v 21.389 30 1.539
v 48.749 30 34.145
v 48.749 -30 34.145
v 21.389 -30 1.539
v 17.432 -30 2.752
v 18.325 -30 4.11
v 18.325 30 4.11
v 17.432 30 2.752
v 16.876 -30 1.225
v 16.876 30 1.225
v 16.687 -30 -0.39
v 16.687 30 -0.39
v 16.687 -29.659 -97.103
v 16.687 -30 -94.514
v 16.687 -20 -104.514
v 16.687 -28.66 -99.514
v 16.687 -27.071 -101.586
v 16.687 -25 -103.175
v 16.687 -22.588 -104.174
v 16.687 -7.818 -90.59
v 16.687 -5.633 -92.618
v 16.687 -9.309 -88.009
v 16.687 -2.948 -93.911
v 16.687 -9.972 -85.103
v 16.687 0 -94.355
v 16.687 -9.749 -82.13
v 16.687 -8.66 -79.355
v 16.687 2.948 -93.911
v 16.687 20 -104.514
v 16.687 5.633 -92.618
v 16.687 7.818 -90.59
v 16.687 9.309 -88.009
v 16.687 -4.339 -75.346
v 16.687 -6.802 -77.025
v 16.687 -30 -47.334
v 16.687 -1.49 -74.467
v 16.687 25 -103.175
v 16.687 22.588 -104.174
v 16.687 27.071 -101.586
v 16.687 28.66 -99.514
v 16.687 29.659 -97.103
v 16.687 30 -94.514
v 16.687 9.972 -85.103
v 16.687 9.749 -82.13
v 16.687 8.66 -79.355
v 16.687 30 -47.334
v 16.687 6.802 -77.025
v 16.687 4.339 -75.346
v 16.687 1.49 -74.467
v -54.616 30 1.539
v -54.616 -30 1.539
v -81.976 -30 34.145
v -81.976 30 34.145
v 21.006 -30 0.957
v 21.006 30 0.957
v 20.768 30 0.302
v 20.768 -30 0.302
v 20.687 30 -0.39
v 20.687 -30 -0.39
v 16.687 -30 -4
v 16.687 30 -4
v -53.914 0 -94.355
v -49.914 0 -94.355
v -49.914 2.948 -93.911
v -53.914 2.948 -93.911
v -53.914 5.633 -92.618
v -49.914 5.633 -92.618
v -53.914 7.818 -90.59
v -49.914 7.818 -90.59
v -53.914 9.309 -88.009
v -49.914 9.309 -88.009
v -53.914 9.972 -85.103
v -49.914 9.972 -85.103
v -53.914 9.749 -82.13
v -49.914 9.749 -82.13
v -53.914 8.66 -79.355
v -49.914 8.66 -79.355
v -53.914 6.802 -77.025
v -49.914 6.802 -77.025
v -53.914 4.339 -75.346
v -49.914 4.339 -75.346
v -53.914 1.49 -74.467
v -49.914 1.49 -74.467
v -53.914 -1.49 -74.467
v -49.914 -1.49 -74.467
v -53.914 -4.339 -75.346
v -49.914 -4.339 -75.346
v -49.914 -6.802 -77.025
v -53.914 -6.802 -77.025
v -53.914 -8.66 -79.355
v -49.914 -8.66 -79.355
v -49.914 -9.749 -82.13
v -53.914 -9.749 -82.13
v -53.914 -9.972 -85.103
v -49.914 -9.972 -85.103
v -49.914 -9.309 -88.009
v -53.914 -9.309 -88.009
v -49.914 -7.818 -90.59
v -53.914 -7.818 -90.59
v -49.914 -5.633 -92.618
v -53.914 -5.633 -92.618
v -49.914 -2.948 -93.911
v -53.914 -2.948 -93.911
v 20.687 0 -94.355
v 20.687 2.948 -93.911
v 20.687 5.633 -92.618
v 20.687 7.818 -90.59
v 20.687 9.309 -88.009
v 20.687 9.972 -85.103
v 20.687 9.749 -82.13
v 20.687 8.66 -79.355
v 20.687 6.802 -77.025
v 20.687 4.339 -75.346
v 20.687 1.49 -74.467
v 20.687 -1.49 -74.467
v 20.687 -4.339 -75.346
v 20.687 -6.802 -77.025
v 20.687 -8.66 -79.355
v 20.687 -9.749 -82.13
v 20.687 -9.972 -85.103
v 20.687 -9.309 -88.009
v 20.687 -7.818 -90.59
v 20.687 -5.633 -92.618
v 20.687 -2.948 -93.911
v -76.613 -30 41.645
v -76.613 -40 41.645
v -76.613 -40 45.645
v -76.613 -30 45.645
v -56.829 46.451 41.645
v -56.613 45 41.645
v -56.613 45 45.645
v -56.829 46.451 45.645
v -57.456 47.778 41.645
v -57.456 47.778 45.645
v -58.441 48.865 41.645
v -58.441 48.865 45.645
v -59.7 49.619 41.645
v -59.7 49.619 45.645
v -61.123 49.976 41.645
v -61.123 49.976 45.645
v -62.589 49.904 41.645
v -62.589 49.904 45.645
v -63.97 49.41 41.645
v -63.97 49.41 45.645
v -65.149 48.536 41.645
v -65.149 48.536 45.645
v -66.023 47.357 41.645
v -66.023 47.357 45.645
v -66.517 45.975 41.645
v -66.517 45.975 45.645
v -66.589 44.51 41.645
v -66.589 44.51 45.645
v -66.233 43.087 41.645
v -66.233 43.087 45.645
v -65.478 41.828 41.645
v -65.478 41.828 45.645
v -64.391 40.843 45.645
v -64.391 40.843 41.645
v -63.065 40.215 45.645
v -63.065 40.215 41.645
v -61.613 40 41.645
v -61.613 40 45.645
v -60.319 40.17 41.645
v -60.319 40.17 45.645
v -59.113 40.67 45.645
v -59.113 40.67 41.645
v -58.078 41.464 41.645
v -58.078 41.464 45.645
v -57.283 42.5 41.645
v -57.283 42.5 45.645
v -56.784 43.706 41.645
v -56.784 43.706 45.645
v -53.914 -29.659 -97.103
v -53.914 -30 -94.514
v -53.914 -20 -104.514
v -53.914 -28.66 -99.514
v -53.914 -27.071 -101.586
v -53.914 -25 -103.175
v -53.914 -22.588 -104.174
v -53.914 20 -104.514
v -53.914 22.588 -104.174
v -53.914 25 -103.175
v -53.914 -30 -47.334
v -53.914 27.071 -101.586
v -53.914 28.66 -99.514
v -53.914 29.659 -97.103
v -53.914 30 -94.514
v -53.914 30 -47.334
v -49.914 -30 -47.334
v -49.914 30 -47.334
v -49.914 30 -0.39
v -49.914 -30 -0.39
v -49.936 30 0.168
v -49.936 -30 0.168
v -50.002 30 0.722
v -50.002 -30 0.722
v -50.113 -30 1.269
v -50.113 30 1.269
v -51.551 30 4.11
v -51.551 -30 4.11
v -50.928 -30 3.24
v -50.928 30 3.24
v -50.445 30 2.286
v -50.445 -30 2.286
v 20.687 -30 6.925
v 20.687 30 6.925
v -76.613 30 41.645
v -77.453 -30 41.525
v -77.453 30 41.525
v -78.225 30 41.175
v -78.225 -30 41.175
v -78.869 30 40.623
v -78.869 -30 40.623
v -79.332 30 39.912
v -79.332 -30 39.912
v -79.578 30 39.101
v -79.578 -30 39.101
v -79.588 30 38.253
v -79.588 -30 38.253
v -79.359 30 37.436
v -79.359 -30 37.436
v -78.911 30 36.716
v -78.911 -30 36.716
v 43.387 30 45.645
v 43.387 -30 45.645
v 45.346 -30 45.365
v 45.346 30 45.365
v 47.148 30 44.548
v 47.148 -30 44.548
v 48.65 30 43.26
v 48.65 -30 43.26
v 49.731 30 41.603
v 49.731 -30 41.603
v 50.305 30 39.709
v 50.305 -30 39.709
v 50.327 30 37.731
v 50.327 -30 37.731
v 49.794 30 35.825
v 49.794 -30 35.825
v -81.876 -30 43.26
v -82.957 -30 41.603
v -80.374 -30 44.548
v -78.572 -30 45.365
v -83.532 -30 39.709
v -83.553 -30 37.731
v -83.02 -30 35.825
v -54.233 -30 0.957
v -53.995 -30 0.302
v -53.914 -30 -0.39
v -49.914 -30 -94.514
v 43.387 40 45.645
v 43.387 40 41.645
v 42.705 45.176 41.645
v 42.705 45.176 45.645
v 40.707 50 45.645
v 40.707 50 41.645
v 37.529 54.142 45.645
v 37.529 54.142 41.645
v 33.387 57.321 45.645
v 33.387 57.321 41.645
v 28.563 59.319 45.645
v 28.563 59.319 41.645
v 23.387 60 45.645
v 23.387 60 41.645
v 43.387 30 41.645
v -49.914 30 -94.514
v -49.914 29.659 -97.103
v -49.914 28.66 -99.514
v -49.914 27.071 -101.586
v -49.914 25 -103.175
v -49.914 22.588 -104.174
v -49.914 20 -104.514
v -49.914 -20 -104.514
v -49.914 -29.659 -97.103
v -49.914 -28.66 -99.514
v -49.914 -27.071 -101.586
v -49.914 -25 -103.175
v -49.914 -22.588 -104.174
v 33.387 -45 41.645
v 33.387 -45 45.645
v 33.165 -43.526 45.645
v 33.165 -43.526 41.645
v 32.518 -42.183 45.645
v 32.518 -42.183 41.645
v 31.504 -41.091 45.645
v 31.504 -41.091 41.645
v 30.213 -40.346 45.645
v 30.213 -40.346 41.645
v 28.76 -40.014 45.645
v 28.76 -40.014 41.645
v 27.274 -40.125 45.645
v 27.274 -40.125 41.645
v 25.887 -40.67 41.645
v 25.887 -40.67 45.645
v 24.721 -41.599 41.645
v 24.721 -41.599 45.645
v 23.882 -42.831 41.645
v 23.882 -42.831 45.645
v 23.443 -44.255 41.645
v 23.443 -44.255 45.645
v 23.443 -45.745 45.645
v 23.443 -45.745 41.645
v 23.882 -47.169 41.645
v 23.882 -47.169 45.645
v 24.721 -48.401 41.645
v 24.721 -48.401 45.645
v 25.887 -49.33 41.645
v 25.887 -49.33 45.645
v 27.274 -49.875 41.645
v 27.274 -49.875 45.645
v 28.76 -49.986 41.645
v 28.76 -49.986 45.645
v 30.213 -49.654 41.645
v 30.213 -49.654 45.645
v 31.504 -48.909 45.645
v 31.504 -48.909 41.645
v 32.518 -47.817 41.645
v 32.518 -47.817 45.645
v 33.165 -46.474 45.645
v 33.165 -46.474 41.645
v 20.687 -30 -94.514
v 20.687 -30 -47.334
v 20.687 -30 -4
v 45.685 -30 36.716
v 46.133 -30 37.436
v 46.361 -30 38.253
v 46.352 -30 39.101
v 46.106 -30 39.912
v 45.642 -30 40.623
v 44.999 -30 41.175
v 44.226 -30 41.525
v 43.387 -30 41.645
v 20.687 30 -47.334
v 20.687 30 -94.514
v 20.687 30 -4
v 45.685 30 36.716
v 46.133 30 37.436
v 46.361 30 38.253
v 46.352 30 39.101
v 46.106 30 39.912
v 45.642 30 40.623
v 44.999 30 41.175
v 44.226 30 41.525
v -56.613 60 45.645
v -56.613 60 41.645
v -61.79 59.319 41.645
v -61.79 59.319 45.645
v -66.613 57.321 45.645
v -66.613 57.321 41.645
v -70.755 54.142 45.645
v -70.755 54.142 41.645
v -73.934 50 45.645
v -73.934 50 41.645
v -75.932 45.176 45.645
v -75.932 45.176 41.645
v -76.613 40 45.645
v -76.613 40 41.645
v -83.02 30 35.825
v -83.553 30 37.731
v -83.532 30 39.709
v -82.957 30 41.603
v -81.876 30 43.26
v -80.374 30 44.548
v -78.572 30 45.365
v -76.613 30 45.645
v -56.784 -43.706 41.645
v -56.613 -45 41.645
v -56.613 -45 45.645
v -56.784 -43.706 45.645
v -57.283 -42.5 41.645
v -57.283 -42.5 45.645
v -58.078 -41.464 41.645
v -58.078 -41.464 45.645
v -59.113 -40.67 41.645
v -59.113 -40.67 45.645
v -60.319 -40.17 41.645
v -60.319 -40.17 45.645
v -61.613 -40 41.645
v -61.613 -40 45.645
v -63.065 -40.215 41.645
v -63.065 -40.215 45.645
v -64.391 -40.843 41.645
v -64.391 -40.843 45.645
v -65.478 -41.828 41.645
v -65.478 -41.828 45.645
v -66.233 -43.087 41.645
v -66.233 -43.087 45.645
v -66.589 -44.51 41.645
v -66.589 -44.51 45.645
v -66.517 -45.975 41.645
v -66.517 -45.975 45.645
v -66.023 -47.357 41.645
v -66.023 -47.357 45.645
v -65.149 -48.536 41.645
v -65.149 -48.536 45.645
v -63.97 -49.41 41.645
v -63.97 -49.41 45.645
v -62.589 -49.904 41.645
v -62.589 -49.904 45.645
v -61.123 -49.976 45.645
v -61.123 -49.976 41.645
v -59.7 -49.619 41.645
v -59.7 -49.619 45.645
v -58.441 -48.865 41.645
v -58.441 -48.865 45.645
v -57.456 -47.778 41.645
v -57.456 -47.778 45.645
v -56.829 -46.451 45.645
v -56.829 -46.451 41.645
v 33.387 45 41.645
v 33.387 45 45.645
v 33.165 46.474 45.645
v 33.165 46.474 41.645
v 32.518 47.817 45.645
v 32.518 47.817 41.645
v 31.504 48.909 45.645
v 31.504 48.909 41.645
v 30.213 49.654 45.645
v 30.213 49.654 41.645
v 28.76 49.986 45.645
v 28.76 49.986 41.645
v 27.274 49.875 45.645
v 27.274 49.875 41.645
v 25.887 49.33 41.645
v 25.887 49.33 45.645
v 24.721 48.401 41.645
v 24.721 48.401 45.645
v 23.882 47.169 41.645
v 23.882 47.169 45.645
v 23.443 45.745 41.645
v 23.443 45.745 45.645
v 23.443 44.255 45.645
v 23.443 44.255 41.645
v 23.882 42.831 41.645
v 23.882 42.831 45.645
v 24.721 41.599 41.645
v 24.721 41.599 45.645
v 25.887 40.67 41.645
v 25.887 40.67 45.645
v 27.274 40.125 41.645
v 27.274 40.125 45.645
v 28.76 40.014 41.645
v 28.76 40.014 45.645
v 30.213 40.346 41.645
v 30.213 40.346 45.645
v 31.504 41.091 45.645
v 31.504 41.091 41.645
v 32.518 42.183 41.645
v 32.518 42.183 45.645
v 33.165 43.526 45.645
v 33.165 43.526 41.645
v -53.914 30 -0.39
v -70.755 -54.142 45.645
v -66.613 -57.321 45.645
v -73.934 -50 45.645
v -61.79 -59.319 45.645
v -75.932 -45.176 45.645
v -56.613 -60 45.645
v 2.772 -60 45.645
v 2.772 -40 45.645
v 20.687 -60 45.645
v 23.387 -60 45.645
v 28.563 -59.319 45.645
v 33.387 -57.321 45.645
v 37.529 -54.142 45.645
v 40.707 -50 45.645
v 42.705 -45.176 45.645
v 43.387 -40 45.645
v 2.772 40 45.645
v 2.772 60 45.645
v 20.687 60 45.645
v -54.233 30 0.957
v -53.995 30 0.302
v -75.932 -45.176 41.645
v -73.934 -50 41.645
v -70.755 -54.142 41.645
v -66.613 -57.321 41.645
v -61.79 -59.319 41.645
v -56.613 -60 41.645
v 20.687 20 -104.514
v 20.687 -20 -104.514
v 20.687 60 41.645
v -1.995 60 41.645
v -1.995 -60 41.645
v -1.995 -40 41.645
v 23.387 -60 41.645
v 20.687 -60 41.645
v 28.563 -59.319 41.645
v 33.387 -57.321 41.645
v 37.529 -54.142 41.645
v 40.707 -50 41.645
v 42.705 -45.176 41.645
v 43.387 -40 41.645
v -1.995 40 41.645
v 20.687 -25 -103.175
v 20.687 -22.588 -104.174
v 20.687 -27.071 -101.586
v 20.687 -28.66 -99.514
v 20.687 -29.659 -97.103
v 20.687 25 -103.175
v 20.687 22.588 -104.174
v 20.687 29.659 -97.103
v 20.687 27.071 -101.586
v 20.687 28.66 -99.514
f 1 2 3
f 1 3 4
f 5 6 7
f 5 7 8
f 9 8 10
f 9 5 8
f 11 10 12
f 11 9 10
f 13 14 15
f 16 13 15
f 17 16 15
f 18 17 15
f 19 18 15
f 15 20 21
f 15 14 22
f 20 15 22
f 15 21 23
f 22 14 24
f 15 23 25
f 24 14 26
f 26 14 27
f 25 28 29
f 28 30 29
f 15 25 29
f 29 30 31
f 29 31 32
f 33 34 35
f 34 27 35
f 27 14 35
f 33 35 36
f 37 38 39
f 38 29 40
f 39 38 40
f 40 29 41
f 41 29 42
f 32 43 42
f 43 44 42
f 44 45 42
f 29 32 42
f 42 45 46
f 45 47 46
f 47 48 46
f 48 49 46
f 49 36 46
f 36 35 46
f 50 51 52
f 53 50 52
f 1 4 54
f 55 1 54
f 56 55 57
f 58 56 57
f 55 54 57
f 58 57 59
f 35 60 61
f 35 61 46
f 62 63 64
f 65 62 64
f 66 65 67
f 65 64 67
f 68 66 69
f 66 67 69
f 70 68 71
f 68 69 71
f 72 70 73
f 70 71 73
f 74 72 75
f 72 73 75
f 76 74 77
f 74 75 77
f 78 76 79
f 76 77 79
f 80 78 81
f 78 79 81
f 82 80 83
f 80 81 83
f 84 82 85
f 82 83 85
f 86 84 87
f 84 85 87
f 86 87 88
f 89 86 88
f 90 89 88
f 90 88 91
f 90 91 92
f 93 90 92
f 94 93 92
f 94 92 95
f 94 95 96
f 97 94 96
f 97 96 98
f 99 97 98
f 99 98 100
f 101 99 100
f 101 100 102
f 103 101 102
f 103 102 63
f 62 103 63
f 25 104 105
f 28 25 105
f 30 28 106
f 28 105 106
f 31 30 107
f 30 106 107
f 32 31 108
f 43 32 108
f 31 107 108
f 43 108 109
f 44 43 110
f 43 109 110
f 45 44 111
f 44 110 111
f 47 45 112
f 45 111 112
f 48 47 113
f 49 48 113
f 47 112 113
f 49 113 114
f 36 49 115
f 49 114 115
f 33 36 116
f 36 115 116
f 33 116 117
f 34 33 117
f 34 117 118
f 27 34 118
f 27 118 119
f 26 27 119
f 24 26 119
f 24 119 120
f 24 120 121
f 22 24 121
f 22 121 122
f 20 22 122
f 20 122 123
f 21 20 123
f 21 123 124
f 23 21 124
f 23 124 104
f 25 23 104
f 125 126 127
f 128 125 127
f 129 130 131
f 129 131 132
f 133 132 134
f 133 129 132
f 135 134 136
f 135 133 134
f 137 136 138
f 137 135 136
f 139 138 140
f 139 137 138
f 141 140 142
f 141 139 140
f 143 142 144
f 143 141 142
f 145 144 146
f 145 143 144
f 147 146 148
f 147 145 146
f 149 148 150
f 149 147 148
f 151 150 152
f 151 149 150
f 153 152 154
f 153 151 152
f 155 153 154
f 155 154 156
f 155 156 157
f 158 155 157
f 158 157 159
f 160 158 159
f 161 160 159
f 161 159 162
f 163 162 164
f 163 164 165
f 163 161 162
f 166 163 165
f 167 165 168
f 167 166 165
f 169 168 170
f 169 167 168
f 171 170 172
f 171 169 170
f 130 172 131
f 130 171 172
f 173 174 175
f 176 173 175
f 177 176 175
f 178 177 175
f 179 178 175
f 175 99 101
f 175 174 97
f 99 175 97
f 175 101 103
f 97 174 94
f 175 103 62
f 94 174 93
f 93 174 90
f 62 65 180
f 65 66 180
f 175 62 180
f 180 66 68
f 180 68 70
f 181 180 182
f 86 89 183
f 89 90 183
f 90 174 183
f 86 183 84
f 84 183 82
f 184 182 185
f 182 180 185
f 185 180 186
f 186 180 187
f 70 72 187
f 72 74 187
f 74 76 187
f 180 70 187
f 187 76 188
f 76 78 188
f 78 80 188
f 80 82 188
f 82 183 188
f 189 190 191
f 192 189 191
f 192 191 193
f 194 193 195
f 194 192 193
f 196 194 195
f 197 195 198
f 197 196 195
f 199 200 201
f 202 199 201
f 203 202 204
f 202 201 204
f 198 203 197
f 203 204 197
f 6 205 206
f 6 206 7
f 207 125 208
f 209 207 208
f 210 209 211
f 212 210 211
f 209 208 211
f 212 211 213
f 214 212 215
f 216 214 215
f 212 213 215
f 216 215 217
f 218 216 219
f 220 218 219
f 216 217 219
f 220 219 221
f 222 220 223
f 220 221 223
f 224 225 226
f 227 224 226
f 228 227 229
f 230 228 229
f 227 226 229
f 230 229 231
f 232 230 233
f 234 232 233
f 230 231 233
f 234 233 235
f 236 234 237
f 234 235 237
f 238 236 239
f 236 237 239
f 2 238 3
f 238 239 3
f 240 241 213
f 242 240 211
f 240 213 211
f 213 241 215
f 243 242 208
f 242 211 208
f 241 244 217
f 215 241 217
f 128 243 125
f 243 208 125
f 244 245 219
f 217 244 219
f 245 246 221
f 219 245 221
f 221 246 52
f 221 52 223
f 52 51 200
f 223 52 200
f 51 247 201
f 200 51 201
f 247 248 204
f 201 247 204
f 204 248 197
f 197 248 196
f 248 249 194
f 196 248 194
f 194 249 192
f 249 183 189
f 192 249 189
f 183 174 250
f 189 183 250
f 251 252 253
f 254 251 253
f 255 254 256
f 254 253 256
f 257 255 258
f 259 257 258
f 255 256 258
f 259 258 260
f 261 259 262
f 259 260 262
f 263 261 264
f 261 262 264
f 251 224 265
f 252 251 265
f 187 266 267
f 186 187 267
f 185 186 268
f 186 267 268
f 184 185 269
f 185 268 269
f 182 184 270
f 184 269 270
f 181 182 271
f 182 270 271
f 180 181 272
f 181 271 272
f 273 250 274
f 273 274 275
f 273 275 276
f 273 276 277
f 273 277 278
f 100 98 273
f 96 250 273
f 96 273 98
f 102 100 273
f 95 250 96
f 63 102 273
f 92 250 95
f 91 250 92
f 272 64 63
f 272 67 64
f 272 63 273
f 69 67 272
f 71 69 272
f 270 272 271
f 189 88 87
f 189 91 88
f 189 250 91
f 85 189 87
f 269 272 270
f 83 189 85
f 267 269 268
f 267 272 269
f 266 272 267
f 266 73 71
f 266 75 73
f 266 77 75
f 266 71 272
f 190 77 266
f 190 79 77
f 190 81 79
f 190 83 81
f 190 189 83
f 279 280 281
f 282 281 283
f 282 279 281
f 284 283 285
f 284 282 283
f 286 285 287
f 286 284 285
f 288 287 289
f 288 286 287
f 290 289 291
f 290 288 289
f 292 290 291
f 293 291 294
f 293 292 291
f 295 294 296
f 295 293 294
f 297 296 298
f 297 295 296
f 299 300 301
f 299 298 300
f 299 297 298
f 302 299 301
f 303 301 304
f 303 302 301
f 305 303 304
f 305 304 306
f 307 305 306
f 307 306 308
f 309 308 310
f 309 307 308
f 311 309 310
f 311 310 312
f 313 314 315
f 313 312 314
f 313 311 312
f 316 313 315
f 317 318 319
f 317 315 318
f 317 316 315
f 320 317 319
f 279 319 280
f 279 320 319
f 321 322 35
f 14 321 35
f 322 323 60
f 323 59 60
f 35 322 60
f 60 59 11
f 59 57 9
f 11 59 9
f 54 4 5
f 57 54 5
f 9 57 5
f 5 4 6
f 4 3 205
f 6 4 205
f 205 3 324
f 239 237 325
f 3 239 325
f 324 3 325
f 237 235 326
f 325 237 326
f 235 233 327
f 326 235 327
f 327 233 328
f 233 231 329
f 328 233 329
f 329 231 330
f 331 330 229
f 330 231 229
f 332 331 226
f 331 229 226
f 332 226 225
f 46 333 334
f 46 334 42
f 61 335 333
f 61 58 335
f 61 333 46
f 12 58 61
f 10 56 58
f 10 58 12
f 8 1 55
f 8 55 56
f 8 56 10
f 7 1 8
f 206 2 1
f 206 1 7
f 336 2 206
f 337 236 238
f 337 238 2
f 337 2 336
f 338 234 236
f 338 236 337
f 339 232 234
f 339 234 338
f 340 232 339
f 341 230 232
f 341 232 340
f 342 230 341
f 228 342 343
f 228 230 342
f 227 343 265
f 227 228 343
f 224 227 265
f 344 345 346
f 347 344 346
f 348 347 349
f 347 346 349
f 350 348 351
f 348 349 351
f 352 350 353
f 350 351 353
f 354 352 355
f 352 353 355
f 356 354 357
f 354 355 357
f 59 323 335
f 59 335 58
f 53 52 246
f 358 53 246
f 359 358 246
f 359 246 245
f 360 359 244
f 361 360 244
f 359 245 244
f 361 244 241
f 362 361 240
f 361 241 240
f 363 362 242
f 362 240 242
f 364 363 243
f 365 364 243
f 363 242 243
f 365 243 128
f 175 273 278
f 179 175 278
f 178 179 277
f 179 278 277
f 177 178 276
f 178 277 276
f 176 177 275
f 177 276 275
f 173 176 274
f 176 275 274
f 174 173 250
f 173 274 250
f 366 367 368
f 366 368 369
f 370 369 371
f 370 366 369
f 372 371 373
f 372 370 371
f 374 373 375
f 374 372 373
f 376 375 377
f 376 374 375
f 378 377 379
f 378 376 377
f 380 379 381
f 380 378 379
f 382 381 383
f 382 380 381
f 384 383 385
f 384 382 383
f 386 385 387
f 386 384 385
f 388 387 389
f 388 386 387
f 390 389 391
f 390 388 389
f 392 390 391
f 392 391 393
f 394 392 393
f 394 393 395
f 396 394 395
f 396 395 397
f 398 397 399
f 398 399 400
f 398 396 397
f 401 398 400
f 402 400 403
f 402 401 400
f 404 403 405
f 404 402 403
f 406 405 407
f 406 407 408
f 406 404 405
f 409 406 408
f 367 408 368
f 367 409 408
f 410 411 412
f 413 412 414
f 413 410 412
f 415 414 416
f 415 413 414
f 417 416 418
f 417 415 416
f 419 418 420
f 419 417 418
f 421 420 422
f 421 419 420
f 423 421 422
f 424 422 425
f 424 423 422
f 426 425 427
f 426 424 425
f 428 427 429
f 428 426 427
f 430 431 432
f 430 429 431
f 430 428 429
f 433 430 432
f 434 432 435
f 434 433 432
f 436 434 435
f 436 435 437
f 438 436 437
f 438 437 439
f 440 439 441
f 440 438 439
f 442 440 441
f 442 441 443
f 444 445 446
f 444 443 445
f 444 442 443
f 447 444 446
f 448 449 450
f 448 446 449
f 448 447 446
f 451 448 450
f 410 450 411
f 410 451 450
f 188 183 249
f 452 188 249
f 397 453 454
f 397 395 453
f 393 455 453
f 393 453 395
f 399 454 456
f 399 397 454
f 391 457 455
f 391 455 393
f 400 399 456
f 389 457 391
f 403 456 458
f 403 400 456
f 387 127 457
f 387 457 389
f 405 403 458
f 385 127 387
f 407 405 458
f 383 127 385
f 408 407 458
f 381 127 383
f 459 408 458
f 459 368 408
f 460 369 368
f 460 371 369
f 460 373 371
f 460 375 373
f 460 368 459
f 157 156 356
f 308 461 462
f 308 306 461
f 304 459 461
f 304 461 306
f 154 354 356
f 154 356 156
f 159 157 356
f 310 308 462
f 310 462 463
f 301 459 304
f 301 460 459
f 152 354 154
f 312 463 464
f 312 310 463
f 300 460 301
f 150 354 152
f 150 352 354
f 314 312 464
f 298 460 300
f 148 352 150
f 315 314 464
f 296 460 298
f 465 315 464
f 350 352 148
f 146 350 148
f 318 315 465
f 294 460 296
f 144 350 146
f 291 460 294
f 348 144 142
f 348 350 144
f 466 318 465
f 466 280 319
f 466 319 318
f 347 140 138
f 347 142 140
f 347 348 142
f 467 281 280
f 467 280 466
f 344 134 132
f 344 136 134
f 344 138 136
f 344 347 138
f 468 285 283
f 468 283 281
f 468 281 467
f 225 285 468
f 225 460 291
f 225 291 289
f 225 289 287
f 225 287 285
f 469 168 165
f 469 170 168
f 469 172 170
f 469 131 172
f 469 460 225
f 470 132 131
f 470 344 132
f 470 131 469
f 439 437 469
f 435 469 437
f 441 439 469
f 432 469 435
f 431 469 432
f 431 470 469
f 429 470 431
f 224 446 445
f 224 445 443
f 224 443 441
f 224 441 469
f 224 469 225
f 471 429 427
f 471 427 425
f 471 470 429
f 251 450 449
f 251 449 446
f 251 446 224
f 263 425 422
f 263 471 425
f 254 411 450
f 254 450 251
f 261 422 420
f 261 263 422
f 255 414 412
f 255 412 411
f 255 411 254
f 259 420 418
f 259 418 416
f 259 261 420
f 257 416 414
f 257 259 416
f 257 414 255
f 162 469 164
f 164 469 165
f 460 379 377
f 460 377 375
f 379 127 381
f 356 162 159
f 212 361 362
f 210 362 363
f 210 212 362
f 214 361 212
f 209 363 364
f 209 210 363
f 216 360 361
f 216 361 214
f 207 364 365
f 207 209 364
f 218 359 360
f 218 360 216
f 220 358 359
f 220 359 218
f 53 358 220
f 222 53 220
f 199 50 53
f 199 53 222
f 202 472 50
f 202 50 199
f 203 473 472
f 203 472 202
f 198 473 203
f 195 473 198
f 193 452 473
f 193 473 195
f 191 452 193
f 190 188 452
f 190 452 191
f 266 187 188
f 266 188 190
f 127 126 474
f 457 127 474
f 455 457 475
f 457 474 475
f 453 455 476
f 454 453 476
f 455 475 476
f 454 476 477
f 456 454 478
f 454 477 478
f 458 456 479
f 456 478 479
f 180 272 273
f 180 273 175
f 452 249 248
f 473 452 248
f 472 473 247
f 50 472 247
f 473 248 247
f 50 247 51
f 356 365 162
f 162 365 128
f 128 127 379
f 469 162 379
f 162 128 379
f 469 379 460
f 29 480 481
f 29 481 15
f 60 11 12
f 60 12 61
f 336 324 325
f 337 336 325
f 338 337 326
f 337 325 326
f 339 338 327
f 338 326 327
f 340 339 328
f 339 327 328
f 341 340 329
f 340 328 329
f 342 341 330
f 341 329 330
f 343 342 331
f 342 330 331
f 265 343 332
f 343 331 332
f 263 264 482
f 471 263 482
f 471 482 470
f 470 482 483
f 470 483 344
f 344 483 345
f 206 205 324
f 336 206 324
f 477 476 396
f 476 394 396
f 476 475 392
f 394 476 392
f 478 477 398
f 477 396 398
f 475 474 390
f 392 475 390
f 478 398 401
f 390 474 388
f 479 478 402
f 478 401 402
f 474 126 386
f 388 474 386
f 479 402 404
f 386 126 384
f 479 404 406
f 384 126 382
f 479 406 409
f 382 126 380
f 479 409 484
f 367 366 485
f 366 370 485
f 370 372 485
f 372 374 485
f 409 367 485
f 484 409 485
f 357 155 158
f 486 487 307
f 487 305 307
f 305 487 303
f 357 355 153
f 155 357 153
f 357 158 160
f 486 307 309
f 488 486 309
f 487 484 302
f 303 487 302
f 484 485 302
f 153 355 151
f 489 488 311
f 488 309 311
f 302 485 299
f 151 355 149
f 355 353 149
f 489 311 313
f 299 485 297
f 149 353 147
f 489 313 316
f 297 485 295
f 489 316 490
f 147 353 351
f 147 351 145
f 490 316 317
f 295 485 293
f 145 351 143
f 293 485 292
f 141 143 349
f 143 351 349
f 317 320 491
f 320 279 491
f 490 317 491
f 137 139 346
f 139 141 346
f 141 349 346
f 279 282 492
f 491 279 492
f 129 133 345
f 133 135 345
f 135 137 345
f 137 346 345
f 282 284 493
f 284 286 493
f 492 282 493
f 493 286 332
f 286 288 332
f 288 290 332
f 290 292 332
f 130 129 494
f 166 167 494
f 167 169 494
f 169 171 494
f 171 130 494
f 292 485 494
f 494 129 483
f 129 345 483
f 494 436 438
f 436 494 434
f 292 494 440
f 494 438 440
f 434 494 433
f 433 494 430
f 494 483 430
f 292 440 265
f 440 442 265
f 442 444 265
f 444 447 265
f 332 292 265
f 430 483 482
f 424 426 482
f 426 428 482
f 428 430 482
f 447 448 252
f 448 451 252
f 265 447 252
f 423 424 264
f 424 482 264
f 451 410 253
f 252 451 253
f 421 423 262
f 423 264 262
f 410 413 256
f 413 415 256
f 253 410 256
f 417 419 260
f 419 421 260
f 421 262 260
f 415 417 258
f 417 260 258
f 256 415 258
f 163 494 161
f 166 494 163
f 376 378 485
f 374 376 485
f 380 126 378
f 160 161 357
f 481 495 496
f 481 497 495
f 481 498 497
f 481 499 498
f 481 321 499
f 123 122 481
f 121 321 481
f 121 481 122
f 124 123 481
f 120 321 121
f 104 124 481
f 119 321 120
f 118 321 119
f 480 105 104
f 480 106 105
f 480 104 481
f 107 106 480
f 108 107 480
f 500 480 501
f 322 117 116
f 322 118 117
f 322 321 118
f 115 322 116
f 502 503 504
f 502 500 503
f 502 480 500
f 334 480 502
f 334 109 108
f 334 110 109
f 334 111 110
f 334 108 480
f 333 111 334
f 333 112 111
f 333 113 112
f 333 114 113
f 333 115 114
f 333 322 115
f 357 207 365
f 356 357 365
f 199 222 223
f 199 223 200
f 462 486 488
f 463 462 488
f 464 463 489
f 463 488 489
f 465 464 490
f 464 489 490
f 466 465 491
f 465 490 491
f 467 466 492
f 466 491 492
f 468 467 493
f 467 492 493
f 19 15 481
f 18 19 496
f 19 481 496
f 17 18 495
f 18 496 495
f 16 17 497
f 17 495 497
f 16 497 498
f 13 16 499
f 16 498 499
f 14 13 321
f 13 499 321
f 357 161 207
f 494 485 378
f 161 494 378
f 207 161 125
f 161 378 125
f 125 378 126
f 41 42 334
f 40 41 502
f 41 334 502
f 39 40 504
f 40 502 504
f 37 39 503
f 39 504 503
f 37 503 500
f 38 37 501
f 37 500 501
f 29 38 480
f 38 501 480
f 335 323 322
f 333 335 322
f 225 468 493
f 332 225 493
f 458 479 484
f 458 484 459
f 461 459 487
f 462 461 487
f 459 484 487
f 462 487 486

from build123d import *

# Parameters (mm, degrees)
SCHIZZO1_R                           = 5
BASE_FLANGIA1_DEPTH                  = 4
BORDO_FLANGIA1_DEPTH                 = 60
BORDO_FLANGIA1_BEND_DEPTH            = 60
PIEGATURA_START                      = -60
PIEGATURA_DELLO_SCHIZZO1_DEPTH       = 120
PIEGATURA_DELLO_SCHIZZO1_2_DEPTH     = 30
PIEGATURA_START_2                    = 30
PIEGATURA_DELLO_SCHIZZO1_3_DEPTH     = 30
PIEGATURA_START_3                    = -30
PIEGATURA_DELLO_SCHIZZO1_4_OUTLINE_W = 4
PIEGATURA_DELLO_SCHIZZO1_4_OUTLINE_H = 43.334436945
PIEGATURA_DELLO_SCHIZZO1_4_DEPTH     = 60
PIEGATURA_START_4                    = -40
PIEGATURA_DELLO_SCHIZZO1_5_DEPTH     = 79.9999999
PIEGATURA_DELLO_SCHIZZO1_6_DEPTH     = 120
PIEGATURA_START_5                    = -33.183921824
PIEGATURA_DELLO_SCHIZZO1_7_OUTLINE_R = 5
PIEGATURA_DELLO_SCHIZZO1_7_DEPTH     = 4
PIEGATURA_DELLO_SCHIZZO2_DEPTH       = 120
PIEGATURA_DELLO_SCHIZZO2_2_DEPTH     = 30
PIEGATURA_DELLO_SCHIZZO2_3_DEPTH     = 30
PIEGATURA_DELLO_SCHIZZO2_4_DEPTH     = 60
PIEGATURA_DELLO_SCHIZZO2_5_DEPTH     = 79.9999999
PIEGATURA_DELLO_SCHIZZO2_6_DEPTH     = 120
PIEGATURA_START_6                    = 41.644539399
PIEGATURA_DELLO_SCHIZZO2_7_OUTLINE_R = 5
PIEGATURA_DELLO_SCHIZZO2_7_DEPTH     = 4
SCHIZZO25_W                          = 4
SCHIZZO25_H                          = 60
ESTRUSIONE_ESTRUSIONE1_DEPTH         = 57.18
TAGLIO_ESTRUSIONE1_DEPTH             = 75


with BuildPart() as part:
    # Base-Flangia1: sheet metal written as solids
    # Schizzo1 → Base-Flangia1 (new body)
    with BuildSketch(Plane.XY):
        with BuildLine():
            Line((40, -60), (-40, -60))
            ThreePointArc((-40, -60), (-54.142135624, -54.142135624), (-60, -40))
            Line((-60, -40), (-60, 40))
            ThreePointArc((-60, 40), (-54.142135624, 54.142135624), (-40, 60))
            Line((-40, 60), (40, 60))
            ThreePointArc((40, 60), (54.142135624, 54.142135624), (60, 40))
            Line((60, 40), (60, -40))
            ThreePointArc((60, -40), (54.142135624, -54.142135624), (40, -60))
        make_face()
        with Locations((-45, 45)):
            Circle(SCHIZZO1_R, mode=Mode.SUBTRACT)
        with Locations((45, 45)):
            Circle(SCHIZZO1_R, mode=Mode.SUBTRACT)
        with Locations((-45, -45)):
            Circle(SCHIZZO1_R, mode=Mode.SUBTRACT)
        with Locations((45, -45)):
            Circle(SCHIZZO1_R, mode=Mode.SUBTRACT)
    extrude(amount=-BASE_FLANGIA1_DEPTH)

    # Bordo-Flangia1: sheet metal written as solids
    # Bordo-Flangia1 section (on a plane across the edge) → Bordo-Flangia1 (add)
    with BuildSketch(Plane(origin=(-66.433520762, -30, -4), x_dir=(0.7660444431189795, 5.514832408348335e-15, 0.6427876096865378), z_dir=(0, 1, 0))):
        with BuildLine():
            Line((-4, 6.433520762), (-4, 99.433520762))
            Line((-4, 99.433520762), (0, 99.433520762))
            Line((0, 99.433520762), (0, 6.433520762))
            ThreePointArc((0, 6.433520762), (1.732145215, 3.7145974), (4.928362829, 4.135387432))
            Line((4.928362829, 4.135387432), (7.499513268, 1.07120966))
            ThreePointArc((7.499513268, 1.07120966), (0.041672168, 0.089366252), (-4, 6.433520762))
        make_face()
    extrude(amount=BORDO_FLANGIA1_DEPTH)

    # Bordo-Flangia1 section 2 (on a plane across the edge) → Bordo-Flangia1 bend (add)
    with BuildSketch(Plane(origin=(66.433520762, 30, -4), x_dir=(-0.7660444431189795, 0, 0.6427876096865378), z_dir=(0, -1, 0))):
        with BuildLine():
            Line((-4, 6.433520762), (-4, 99.433520762))
            Line((-4, 99.433520762), (0, 99.433520762))
            Line((0, 99.433520762), (0, 6.433520762))
            ThreePointArc((0, 6.433520762), (1.732145215, 3.7145974), (4.928362829, 4.135387432))
            Line((4.928362829, 4.135387432), (7.499513268, 1.07120966))
            ThreePointArc((7.499513268, 1.07120966), (0.041672168, 0.089366252), (-4, 6.433520762))
        make_face()
    extrude(amount=BORDO_FLANGIA1_BEND_DEPTH)

    # Piegatura dello schizzo1: read off the stored shape, not the designer's step
    # Piegatura dello schizzo1 outline → Piegatura dello schizzo1 (cut)
    with BuildSketch(Plane(origin=(0, 0, 0), x_dir=(1, 0, 0), z_dir=(0, 1, 0)).offset(PIEGATURA_START)):
        with BuildLine():
            Line((-36.841112184, 41.814650875), (-40.46038277, 41.17647582))
            Line((-40.46038277, 41.17647582), (-62.777646918, 14.579796095))
            Line((-62.777646918, 14.579796095), (-59.713469145, 12.008645656))
            Line((-59.713469145, 12.008645656), (-32.694338326, 44.208791879))
            ThreePointArc((-32.694338326, 44.208791879), (-34.556649428, 42.64612732), (-36.841112184, 41.814650875))
        make_face()
        with BuildLine():
            Line((-62.284619584, 8.944467884), (-65.348797357, 11.515618323))
            Line((-65.348797357, 11.515618323), (-65.362311102, 11.499513268))
            ThreePointArc((-65.362311102, 11.499513268), (-66.344154509, 4.041672168), (-60, 0))
            Line((-60, 0), (-51.62501785, 0))
            Line((-51.62501785, 0), (-56.39203222, 4))
            Line((-56.39203222, 4), (-60, 4))
            ThreePointArc((-60, 4), (-62.718923361, 5.732145215), (-62.298133329, 8.928362829))
            Line((-62.298133329, 8.928362829), (-62.284619584, 8.944467884))
        make_face()
        Polygon((16.687147766, 4), (-50.169136913, 4), (-45.402122543, 0), (16.687147765, 0), align=None)
        with BuildLine():
            Line((60, 4), (20.687147766, 4))
            Line((20.687147766, 4), (20.687147765, 0))
            Line((20.687147765, 0), (60, 0))
            ThreePointArc((60, 0), (66.344154509, 4.041672168), (65.362311102, 11.499513268))
            Line((65.362311102, 11.499513268), (5.583063401, 82.741646478))
            Line((5.583063401, 82.741646478), (2.518885629, 80.170496039))
            Line((2.518885629, 80.170496039), (62.298133329, 8.928362829))
            ThreePointArc((62.298133329, 8.928362829), (62.718923361, 5.732145215), (60, 4))
        make_face()
    extrude(amount=PIEGATURA_DELLO_SCHIZZO1_DEPTH, mode=Mode.SUBTRACT)

    # Piegatura dello schizzo1 2 outline → Piegatura dello schizzo1 2 (cut)
    with BuildSketch(Plane(origin=(0, 0, 0), x_dir=(1, 0, 0), z_dir=(0, 1, 0)).offset(PIEGATURA_START)):
        Polygon((20.687147766, 4), (16.687147766, 4), (16.687147765, 0), (20.687147765, 0), align=None)
    extrude(amount=PIEGATURA_DELLO_SCHIZZO1_2_DEPTH, mode=Mode.SUBTRACT)

    # Piegatura dello schizzo1 3 outline → Piegatura dello schizzo1 3 (cut)
    with BuildSketch(Plane(origin=(0, 0, 0), x_dir=(1, 0, 0), z_dir=(0, 1, 0)).offset(PIEGATURA_START_2)):
        Polygon((20.687147766, 4), (16.687147766, 4), (16.687147765, 0), (20.687147765, 0), align=None)
    extrude(amount=PIEGATURA_DELLO_SCHIZZO1_3_DEPTH, mode=Mode.SUBTRACT)

    # Piegatura dello schizzo1 4 outline → Piegatura dello schizzo1 4 (add)
    with BuildSketch(Plane(origin=(0, 0, 0), x_dir=(1, 0, 0), z_dir=(0, 1, 0)).offset(PIEGATURA_START_3)):
        with BuildLine():
            ThreePointArc((-80.166548238, 29.170816779), (-81.135962887, 32.245407244), (-78.759129941, 34.423373367))
            Line((-78.759129941, 34.423373367), (-40.46038277, 41.17647582))
            Line((-40.46038277, 41.17647582), (-35.758516099, 46.779942317))
            ThreePointArc((-35.758516099, 46.779942317), (-36.556649428, 46.110228935), (-37.535704895, 45.753881887))
            Line((-37.535704895, 45.753881887), (-79.453722652, 38.362604379))
            ThreePointArc((-79.453722652, 38.362604379), (-84.999666192, 33.280683424), (-82.737698676, 26.106639007))
            Line((-82.737698676, 26.106639007), (-65.348797357, 11.515618323))
            Line((-65.348797357, 11.515618323), (-62.777646918, 14.579796095))
            Line((-62.777646918, 14.579796095), (-80.166548238, 29.170816779))
        make_face()
        Polygon((-50.169136913, 4), (-59.713469145, 12.008645656), (-62.284619584, 8.944467884), (-56.39203222, 4), align=None)
        with BuildLine():
            Line((11.758784936, -47.963696384), (-45.402122543, 0))
            Line((-45.402122543, 0), (-51.62501785, 0))
            Line((-51.62501785, 0), (9.187634497, -51.027874157))
            ThreePointArc((9.187634497, -51.027874157), (16.645475597, -52.009717564), (20.687147765, -45.665563055))
            Line((20.687147765, -45.665563055), (20.687147765, 0))
            Line((20.687147765, 0), (16.687147765, 0))
            Line((16.687147765, 0), (16.687147765, -45.665563055))
            ThreePointArc((16.687147765, -45.665563055), (14.95500255, -48.384486416), (11.758784936, -47.963696384))
        make_face()
        with Locations((18.687147766, 25.667218473)):
            Rectangle(PIEGATURA_DELLO_SCHIZZO1_4_OUTLINE_W, PIEGATURA_DELLO_SCHIZZO1_4_OUTLINE_H)
    extrude(amount=PIEGATURA_DELLO_SCHIZZO1_4_DEPTH)

    # Piegatura dello schizzo1 5 outline → Piegatura dello schizzo1 5 (add)
    with BuildSketch(Plane(origin=(0, 0, 0), x_dir=(1, 0, 0), z_dir=(0, 1, 0)).offset(PIEGATURA_START_4)):
        Polygon((-80.166548238, 29.170816779), (-82.737698676, 26.106639007), (-56.39203222, 4), (-50.169136913, 4), align=None)
        Polygon((11.758784936, -47.963696384), (-45.402122543, 0), (-51.62501785, 0), (9.187634497, -51.027874157), align=None)
    extrude(amount=PIEGATURA_DELLO_SCHIZZO1_5_DEPTH)

    # Piegatura dello schizzo1 6 outline → Piegatura dello schizzo1 6 (add)
    with BuildSketch(Plane(origin=(0, 0, 0), x_dir=(1, 0, 0), z_dir=(0, 1, 0)).offset(PIEGATURA_START)):
        Polygon((-62.777646918, 14.579796095), (-65.348797357, 11.515618323), (-51.62501785, 0), (-45.402122543, 0), align=None)
    extrude(amount=PIEGATURA_DELLO_SCHIZZO1_6_DEPTH)

    # Piegatura dello schizzo1 7 outline → Piegatura dello schizzo1 7 (add)
    with BuildSketch(Plane(origin=(0, 0, 0), x_dir=(0.7660444431125499, 0, 0.6427876096942), z_dir=(0.6427876096942, 0, -0.76604444311255)).offset(PIEGATURA_START_5)):
        with BuildLine():
            Line((-80.161778391, 40), (-80.161778391, -40))
            ThreePointArc((-80.161778391, -40), (-74.303914015, -54.142135624), (-60.161778391, -60))
            Line((-60.161778391, -60), (19.838221609, -60))
            ThreePointArc((19.838221609, -60), (33.980357233, -54.142135624), (39.838221609, -40))
            Line((39.838221609, -40), (39.838221609, 40))
            ThreePointArc((39.838221609, 40), (33.980357233, 54.142135624), (19.838221609, 60))
            Line((19.838221609, 60), (-60.161778391, 60))
            ThreePointArc((-60.161778391, 60), (-74.303914015, 54.142135624), (-80.161778391, 40))
        make_face()
        with Locations((-65.161778391, -45)):
            Circle(PIEGATURA_DELLO_SCHIZZO1_7_OUTLINE_R, mode=Mode.SUBTRACT)
        with Locations((24.838221609, -45)):
            Circle(PIEGATURA_DELLO_SCHIZZO1_7_OUTLINE_R, mode=Mode.SUBTRACT)
        with Locations((-65.161778391, 45)):
            Circle(PIEGATURA_DELLO_SCHIZZO1_7_OUTLINE_R, mode=Mode.SUBTRACT)
        with Locations((24.838221609, 45)):
            Circle(PIEGATURA_DELLO_SCHIZZO1_7_OUTLINE_R, mode=Mode.SUBTRACT)
    extrude(amount=PIEGATURA_DELLO_SCHIZZO1_7_DEPTH)

    # Piegatura dello schizzo2: read off the stored shape, not the designer's step
    # Piegatura dello schizzo2 outline → Piegatura dello schizzo2 (cut)
    with BuildSketch(Plane(origin=(0, 0, 0), x_dir=(1, 0, 0), z_dir=(0, 1, 0)).offset(PIEGATURA_START)):
        with BuildLine():
            Line((20.687147765, -41.6445394), (20.687147765, -6.925039813))
            Line((20.687147765, -6.925039813), (18.324836664, -4.109747071))
            ThreePointArc((18.324836664, -4.109747071), (17.10929942, -2.004374806), (16.687147765, 0.389766197))
            Line((16.687147765, 0.389766197), (16.687147765, -41.6445394))
            Line((16.687147765, -41.6445394), (20.687147765, -41.6445394))
        make_face()
        with BuildLine():
            Line((20.687147765, -45.665563055), (20.687147765, -45.6445394))
            Line((20.687147765, -45.6445394), (16.687147765, -45.6445394))
            Line((16.687147765, -45.6445394), (16.687147765, -45.665563055))
            ThreePointArc((16.687147765, -45.665563055), (14.95500255, -48.384486416), (11.758784936, -47.963696384))
            Line((11.758784936, -47.963696384), (8.994921268, -45.6445394))
            Line((8.994921268, -45.6445394), (2.77202596, -45.6445394))
            Line((2.77202596, -45.6445394), (9.187634497, -51.027874157))
            ThreePointArc((9.187634497, -51.027874157), (16.645475597, -52.009717564), (20.687147765, -45.665563055))
        make_face()
        with BuildLine():
            Line((-1.99498841, -41.6445394), (4.227906898, -41.6445394))
            Line((4.227906898, -41.6445394), (-49.913655163, 3.785625357))
            Line((-49.913655163, 3.785625357), (-49.913655163, 0.389766198))
            ThreePointArc((-49.913655163, 0.389766198), (-49.963662862, -0.445462526), (-50.112971454, -1.268757573))
            Line((-50.112971454, -1.268757573), (-1.99498841, -41.6445394))
        make_face()
        with BuildLine():
            Line((-49.913655163, 43.571315289), (-49.913655163, 39.509608841))
            Line((-49.913655163, 39.509608841), (-36.841112184, 41.814650875))
            ThreePointArc((-36.841112184, 41.814650875), (-34.556649428, 42.64612732), (-32.694338326, 44.208791879))
            Line((-32.694338326, 44.208791879), (-2.518885629, 80.170496039))
            Line((-2.518885629, 80.170496039), (-5.583063401, 82.741646478))
            Line((-5.583063401, 82.741646478), (-35.758516099, 46.779942317))
            ThreePointArc((-35.758516099, 46.779942317), (-36.556649428, 46.110228935), (-37.535704895, 45.753881887))
            Line((-37.535704895, 45.753881887), (-49.913655163, 43.571315289))
        make_face()
        with BuildLine():
            Line((-53.913655163, 1.920394725), (-53.913655163, 7.142023882))
            Line((-53.913655163, 7.142023882), (-80.166548238, 29.170816779))
            ThreePointArc((-80.166548238, 29.170816779), (-81.135962887, 32.245407244), (-78.759129941, 34.423373367))
            Line((-78.759129941, 34.423373367), (-53.913655163, 38.804300919))
            Line((-53.913655163, 38.804300919), (-53.913655163, 42.866007366))
            Line((-53.913655163, 42.866007366), (-79.453722652, 38.362604379))
            ThreePointArc((-79.453722652, 38.362604379), (-84.999666192, 33.280683424), (-82.737698676, 26.106639007))
            Line((-82.737698676, 26.106639007), (-53.913655163, 1.920394725))
        make_face()
    extrude(amount=PIEGATURA_DELLO_SCHIZZO2_DEPTH, mode=Mode.SUBTRACT)

    # Piegatura dello schizzo2 2 outline → Piegatura dello schizzo2 2 (cut)
    with BuildSketch(Plane(origin=(0, 0, 0), x_dir=(1, 0, 0), z_dir=(0, 1, 0)).offset(PIEGATURA_START)):
        with BuildLine():
            Line((-49.913655163, 0.389766198), (-49.913655163, 3.785625357))
            Line((-49.913655163, 3.785625357), (-53.913655163, 7.142023882))
            Line((-53.913655163, 7.142023882), (-53.913655163, 1.920394725))
            Line((-53.913655163, 1.920394725), (-50.112971454, -1.268757573))
            ThreePointArc((-50.112971454, -1.268757573), (-49.963662862, -0.445462526), (-49.913655163, 0.389766198))
        make_face()
    extrude(amount=PIEGATURA_DELLO_SCHIZZO2_2_DEPTH, mode=Mode.SUBTRACT)

    # Piegatura dello schizzo2 3 outline → Piegatura dello schizzo2 3 (cut)
    with BuildSketch(Plane(origin=(0, 0, 0), x_dir=(1, 0, 0), z_dir=(0, 1, 0)).offset(PIEGATURA_START_2)):
        with BuildLine():
            Line((-49.913655163, 0.389766198), (-49.913655163, 3.785625357))
            Line((-49.913655163, 3.785625357), (-53.913655163, 7.142023882))
            Line((-53.913655163, 7.142023882), (-53.913655163, 1.920394725))
            Line((-53.913655163, 1.920394725), (-50.112971454, -1.268757573))
            ThreePointArc((-50.112971454, -1.268757573), (-49.963662862, -0.445462526), (-49.913655163, 0.389766198))
        make_face()
    extrude(amount=PIEGATURA_DELLO_SCHIZZO2_3_DEPTH, mode=Mode.SUBTRACT)

    # Piegatura dello schizzo2 4 outline → Piegatura dello schizzo2 4 (add)
    with BuildSketch(Plane(origin=(0, 0, 0), x_dir=(1, 0, 0), z_dir=(0, 1, 0)).offset(PIEGATURA_START_3)):
        with BuildLine():
            Line((48.749057403, -34.145026132), (21.389014436, -1.538596632))
            ThreePointArc((21.389014436, -1.538596632), (20.868069903, -0.636294233), (20.687147765, 0.389766197))
            Line((20.687147765, 0.389766197), (20.687147765, -6.925039813))
            Line((20.687147765, -6.925039813), (45.68487963, -36.716176571))
            ThreePointArc((45.68487963, -36.716176571), (46.105669662, -39.912394185), (43.386746301, -41.6445394))
            Line((43.386746301, -41.6445394), (20.687147765, -41.6445394))
            Line((20.687147765, -41.6445394), (20.687147765, -45.6445394))
            Line((20.687147765, -45.6445394), (43.386746301, -45.6445394))
            ThreePointArc((43.386746301, -45.6445394), (49.73090081, -41.602867232), (48.749057403, -34.145026132))
        make_face()
        Polygon((8.994921268, -45.6445394), (16.687147765, -45.6445394), (16.687147765, -41.6445394), (4.227906898, -41.6445394), align=None)
        with BuildLine():
            Line((-76.613253699, -45.644539399), (2.77202596, -45.6445394))
            Line((2.77202596, -45.6445394), (-1.99498841, -41.6445394))
            Line((-1.99498841, -41.6445394), (-76.613253699, -41.644539399))
            ThreePointArc((-76.613253699, -41.644539399), (-79.33217706, -39.912394184), (-78.911387028, -36.71617657))
            Line((-78.911387028, -36.71617657), (-51.551344061, -4.10974707))
            ThreePointArc((-51.551344061, -4.10974707), (-50.668463731, -2.772129433), (-50.112971454, -1.268757573))
            Line((-50.112971454, -1.268757573), (-53.913655163, 1.920394725))
            Line((-53.913655163, 1.920394725), (-53.913655163, 0.389766198))
            ThreePointArc((-53.913655163, 0.389766198), (-54.0945773, -0.636294232), (-54.615521833, -1.538596631))
            Line((-54.615521833, -1.538596631), (-81.975564801, -34.145026131))
            ThreePointArc((-81.975564801, -34.145026131), (-82.957408208, -41.602867231), (-76.613253699, -45.644539399))
        make_face()
        Polygon((-53.913655163, 7.142023882), (-49.913655163, 3.785625357), (-49.913655163, 39.509608841), (-53.913655163, 38.804300919), align=None)
        Polygon((-53.913655163, 42.866007366), (-49.913655163, 43.571315289), (-49.913655163, 47.334436946), (-53.913655163, 47.334436946), align=None)
    extrude(amount=PIEGATURA_DELLO_SCHIZZO2_4_DEPTH)

    # Piegatura dello schizzo2 5 outline → Piegatura dello schizzo2 5 (add)
    with BuildSketch(Plane(origin=(0, 0, 0), x_dir=(1, 0, 0), z_dir=(0, 1, 0)).offset(PIEGATURA_START_4)):
        Polygon((43.386746301, -45.6445394), (43.386746301, -41.6445394), (4.227906898, -41.6445394), (8.994921268, -45.6445394), align=None)
        Polygon((-76.613253699, -45.644539399), (2.77202596, -45.6445394), (-1.99498841, -41.6445394), (-76.613253699, -41.644539399), align=None)
    extrude(amount=PIEGATURA_DELLO_SCHIZZO2_5_DEPTH)

    # Piegatura dello schizzo2 6 outline → Piegatura dello schizzo2 6 (add)
    with BuildSketch(Plane(origin=(0, 0, 0), x_dir=(1, 0, 0), z_dir=(0, 1, 0)).offset(PIEGATURA_START)):
        Polygon((20.687147765, -45.6445394), (20.687147765, -41.6445394), (-1.99498841, -41.6445394), (2.77202596, -45.6445394), align=None)
    extrude(amount=PIEGATURA_DELLO_SCHIZZO2_6_DEPTH)

    # Piegatura dello schizzo2 7 outline → Piegatura dello schizzo2 7 (add)
    with BuildSketch(Plane.XY.offset(PIEGATURA_START_6)):
        with BuildLine():
            ThreePointArc((-56.613253699, 60), (-70.755389322, 54.142135624), (-76.613253699, 40))
            Line((-76.613253699, 40), (-76.613253699, -40))
            ThreePointArc((-76.613253699, -40), (-70.755389322, -54.142135624), (-56.613253699, -60))
            Line((-56.613253699, -60), (23.386746301, -60))
            ThreePointArc((23.386746301, -60), (37.528881925, -54.142135624), (43.386746301, -40))
            Line((43.386746301, -40), (43.386746301, 40))
            ThreePointArc((43.386746301, 40), (37.528881925, 54.142135624), (23.386746301, 60))
            Line((23.386746301, 60), (-56.613253699, 60))
        make_face()
        with Locations((-61.613253699, -45)):
            Circle(PIEGATURA_DELLO_SCHIZZO2_7_OUTLINE_R, mode=Mode.SUBTRACT)
        with Locations((28.386746301, -45)):
            Circle(PIEGATURA_DELLO_SCHIZZO2_7_OUTLINE_R, mode=Mode.SUBTRACT)
        with Locations((-61.613253699, 45)):
            Circle(PIEGATURA_DELLO_SCHIZZO2_7_OUTLINE_R, mode=Mode.SUBTRACT)
        with Locations((28.386746301, 45)):
            Circle(PIEGATURA_DELLO_SCHIZZO2_7_OUTLINE_R, mode=Mode.SUBTRACT)
    extrude(amount=PIEGATURA_DELLO_SCHIZZO2_7_DEPTH)

    # Schizzo25 → Estrusione-Estrusione1 (add)
    with BuildSketch(Plane(origin=(0, 0, -47.334436945), x_dir=(-1.0, 0, -1.000266536266281e-11), z_dir=(1.000266536266281e-11, 4.012514324582407e-15, -1.0))):
        with Locations((-18.687147765, 0)):
            Rectangle(SCHIZZO25_W, SCHIZZO25_H)
        with Locations((51.913655163, 0)):
            Rectangle(SCHIZZO25_W, SCHIZZO25_H)
    extrude(amount=ESTRUSIONE_ESTRUSIONE1_DEPTH)

    # Schizzo26 → Taglio-Estrusione1 (cut)
    with BuildSketch(Plane(origin=(20.687147765, 0, 0), x_dir=(1.0002665362662809e-11, 0, -1.0), z_dir=(1.0, 2.37833744873856e-15, 1.0002665362662809e-11))):
        with BuildLine():
            ThreePointArc((74.355460601, 0), (84.355460601, -10), (94.355460601, 0))
            Line((94.355460601, 0), (74.355460601, 0))
        make_face()
        with BuildLine():
            Line((74.355460601, 0), (94.355460601, 0))
            ThreePointArc((94.355460601, 0), (84.355460601, 10), (74.355460601, 0))
        make_face()
        with BuildLine():
            Line((104.514436945, -30), (104.514436945, -20))
            ThreePointArc((104.514436945, -20), (101.585504757, -27.071067812), (94.514436945, -30))
            Line((94.514436945, -30), (104.514436945, -30))
        make_face()
        with BuildLine():
            ThreePointArc((94.514436945, 30), (101.585504757, 27.071067812), (104.514436945, 20))
            Line((104.514436945, 20), (104.514436945, 30))
            Line((104.514436945, 30), (94.514436945, 30))
        make_face()
    extrude(amount=-TAGLIO_ESTRUSIONE1_DEPTH, mode=Mode.SUBTRACT)


solid = part.part
